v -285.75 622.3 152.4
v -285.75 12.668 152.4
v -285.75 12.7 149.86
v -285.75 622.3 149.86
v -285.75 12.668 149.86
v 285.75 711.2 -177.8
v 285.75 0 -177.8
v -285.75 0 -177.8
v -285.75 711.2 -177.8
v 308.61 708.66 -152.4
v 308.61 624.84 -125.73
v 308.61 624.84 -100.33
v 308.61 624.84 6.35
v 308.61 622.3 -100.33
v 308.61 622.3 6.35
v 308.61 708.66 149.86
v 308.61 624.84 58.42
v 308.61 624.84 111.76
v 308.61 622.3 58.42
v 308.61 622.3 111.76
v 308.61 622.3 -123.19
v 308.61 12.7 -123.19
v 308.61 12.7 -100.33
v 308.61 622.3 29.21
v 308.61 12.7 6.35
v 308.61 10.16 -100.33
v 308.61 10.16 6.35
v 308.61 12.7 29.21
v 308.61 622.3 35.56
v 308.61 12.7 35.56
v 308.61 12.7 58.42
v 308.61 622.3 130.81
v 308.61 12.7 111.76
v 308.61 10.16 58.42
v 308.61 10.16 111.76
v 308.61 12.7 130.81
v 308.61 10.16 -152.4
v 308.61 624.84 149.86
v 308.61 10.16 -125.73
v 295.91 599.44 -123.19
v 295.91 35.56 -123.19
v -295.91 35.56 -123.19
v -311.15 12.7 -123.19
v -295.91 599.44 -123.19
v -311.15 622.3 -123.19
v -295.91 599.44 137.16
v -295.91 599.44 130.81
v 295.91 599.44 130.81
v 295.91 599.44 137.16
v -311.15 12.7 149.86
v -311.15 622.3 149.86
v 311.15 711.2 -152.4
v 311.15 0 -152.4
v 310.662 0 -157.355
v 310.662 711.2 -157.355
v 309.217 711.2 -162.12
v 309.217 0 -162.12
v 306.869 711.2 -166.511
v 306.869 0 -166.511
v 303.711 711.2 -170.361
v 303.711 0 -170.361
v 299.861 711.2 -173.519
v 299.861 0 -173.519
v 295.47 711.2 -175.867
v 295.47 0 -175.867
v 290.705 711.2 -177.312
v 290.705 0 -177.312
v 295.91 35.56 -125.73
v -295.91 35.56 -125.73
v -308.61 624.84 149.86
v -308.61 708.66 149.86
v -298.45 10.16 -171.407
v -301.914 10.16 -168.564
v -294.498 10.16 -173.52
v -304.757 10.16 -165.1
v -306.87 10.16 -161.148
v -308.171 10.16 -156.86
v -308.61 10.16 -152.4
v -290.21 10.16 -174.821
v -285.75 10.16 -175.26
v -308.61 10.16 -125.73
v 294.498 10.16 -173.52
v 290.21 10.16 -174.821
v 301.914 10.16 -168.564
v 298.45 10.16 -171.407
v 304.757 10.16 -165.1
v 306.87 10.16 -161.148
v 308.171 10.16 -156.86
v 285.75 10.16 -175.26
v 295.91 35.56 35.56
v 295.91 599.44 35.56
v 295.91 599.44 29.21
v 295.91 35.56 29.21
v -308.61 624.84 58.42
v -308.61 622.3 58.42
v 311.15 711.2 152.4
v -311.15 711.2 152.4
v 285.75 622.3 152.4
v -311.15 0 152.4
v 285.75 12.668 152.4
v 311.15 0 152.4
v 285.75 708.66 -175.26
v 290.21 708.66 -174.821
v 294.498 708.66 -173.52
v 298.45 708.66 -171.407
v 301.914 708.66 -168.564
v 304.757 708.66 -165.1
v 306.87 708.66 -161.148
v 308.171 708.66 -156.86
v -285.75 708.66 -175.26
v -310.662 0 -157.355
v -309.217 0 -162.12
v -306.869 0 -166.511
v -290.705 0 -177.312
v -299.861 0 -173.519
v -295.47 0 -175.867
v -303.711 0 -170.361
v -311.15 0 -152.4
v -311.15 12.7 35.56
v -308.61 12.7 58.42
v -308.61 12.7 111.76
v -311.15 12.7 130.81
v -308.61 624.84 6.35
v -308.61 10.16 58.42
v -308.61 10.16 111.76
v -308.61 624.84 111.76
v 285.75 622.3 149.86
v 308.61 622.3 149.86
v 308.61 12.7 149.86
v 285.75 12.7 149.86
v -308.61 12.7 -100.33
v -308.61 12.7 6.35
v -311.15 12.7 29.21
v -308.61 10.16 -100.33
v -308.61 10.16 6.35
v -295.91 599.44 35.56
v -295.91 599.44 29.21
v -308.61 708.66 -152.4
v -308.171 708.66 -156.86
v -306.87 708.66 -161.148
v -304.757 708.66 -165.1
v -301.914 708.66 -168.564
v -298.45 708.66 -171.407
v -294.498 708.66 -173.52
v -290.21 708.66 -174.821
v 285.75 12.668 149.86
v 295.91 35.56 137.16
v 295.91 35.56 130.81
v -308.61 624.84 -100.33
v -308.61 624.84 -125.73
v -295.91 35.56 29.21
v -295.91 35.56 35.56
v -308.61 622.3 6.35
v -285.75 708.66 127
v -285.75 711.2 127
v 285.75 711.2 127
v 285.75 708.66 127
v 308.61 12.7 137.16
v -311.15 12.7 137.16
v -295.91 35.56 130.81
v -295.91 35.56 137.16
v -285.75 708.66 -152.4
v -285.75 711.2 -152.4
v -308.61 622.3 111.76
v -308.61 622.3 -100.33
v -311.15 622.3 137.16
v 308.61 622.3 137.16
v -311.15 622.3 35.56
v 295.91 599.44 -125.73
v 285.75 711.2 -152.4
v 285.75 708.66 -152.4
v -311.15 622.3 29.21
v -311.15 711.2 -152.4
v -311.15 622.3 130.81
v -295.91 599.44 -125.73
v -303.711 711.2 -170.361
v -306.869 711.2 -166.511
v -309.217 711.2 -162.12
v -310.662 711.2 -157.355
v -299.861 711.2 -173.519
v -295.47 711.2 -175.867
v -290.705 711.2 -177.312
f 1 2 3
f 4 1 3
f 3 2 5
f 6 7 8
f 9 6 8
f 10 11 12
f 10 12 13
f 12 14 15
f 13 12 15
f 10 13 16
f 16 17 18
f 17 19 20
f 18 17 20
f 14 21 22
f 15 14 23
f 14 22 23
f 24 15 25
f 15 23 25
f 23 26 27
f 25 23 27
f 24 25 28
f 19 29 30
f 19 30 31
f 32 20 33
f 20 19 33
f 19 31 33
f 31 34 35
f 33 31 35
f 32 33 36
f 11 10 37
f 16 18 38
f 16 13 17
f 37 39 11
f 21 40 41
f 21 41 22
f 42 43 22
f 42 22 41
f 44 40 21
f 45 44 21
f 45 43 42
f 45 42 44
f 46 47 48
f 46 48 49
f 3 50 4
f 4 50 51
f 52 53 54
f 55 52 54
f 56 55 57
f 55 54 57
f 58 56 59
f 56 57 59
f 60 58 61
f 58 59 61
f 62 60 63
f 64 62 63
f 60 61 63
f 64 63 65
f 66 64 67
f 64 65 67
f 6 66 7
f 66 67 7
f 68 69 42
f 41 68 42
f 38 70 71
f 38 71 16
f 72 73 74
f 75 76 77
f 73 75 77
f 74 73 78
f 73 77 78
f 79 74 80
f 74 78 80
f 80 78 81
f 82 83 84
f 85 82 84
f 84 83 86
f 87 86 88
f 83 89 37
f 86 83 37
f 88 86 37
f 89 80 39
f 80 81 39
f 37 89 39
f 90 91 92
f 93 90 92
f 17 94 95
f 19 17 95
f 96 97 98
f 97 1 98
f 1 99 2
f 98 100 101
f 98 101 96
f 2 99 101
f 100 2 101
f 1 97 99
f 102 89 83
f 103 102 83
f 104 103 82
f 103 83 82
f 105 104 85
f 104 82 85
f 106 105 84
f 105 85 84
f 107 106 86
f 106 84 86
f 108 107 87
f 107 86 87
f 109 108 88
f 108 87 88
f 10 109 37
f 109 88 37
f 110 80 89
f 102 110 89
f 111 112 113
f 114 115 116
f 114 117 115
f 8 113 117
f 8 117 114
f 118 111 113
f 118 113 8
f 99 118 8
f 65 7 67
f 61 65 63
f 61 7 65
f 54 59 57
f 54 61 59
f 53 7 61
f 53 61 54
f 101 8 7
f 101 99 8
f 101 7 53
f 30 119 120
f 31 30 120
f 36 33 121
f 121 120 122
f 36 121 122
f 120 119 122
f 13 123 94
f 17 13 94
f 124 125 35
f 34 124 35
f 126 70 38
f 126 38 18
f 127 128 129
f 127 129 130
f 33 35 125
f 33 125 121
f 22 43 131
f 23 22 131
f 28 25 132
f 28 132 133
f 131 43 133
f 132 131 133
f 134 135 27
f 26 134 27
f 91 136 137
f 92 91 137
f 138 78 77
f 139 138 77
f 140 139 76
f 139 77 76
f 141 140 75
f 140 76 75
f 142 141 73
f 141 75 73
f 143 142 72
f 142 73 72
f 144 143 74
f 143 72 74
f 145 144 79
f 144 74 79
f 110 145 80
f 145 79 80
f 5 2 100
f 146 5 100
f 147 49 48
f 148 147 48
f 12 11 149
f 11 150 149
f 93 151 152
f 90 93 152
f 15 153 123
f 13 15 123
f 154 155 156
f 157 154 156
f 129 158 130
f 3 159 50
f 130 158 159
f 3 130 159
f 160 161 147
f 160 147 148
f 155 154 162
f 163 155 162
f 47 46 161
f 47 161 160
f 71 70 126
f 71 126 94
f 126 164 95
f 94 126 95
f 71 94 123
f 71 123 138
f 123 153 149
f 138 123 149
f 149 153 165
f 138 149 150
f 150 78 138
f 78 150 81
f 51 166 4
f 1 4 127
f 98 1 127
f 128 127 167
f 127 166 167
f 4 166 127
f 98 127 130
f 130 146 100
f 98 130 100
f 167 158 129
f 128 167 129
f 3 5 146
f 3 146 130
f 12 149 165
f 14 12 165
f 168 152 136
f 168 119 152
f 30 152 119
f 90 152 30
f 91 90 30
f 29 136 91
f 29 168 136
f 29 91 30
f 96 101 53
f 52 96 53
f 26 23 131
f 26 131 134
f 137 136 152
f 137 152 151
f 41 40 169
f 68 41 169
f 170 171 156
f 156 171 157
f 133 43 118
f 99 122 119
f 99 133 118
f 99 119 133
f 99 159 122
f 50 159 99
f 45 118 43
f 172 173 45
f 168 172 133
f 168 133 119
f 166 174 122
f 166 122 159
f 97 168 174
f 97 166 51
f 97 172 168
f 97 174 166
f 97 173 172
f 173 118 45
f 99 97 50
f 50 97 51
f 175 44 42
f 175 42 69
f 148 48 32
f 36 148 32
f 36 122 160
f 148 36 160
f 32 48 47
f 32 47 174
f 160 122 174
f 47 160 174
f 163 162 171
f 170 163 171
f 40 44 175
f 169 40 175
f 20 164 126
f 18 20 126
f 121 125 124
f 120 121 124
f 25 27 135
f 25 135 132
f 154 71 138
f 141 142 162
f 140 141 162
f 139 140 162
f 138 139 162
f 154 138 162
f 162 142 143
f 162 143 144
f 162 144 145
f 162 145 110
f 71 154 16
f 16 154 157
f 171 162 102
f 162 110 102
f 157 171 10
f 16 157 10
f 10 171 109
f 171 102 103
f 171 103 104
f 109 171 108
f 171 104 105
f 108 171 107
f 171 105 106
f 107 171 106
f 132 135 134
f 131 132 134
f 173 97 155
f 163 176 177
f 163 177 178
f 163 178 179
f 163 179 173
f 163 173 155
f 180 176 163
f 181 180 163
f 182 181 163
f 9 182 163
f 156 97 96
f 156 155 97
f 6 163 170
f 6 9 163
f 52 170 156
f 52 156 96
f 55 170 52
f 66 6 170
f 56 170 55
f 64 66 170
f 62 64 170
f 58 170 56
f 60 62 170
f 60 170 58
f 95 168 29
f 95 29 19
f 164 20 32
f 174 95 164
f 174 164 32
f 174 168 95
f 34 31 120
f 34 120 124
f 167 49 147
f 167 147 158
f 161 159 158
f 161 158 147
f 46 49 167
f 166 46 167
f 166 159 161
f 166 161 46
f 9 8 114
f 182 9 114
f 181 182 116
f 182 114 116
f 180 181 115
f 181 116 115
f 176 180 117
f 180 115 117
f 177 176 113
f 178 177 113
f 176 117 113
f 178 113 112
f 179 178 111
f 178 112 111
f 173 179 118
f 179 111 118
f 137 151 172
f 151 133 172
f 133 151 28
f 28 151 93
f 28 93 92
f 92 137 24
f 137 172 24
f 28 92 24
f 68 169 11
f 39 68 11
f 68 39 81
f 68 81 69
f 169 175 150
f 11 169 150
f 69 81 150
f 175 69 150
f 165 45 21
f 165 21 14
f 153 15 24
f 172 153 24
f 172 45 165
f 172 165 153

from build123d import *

# Parameters (mm, degrees)
BOSS_EXTRUDE1_DEPTH = 711.2
BOSS_EXTRUDE2_REACH = 963.601
SKETCH2_W           = 12.7
SKETCH2_H           = 2.54
SKETCH3_W           = 152.4
SKETCH3_H           = 609.6
SKETCH3_W_2         = 95.25
SKETCH3_W_3         = 12.7
CUT_EXTRUDE1_DEPTH  = 2.54
SKETCH4_W           = 12.7
SKETCH4_H           = 6.35
SKETCH4_H_2         = 2.54
BOSS_EXTRUDE3_DEPTH = 589.28
SKETCH5_W           = 571.5
SKETCH5_H           = 12.668198963
BOSS_EXTRUDE4_DEPTH = 2.54
BOSS_EXTRUDE5_START = -2.54
BOSS_EXTRUDE5_DEPTH = 2.54
SKETCH7_W           = 571.5
SKETCH7_H           = 19.05
BOSS_EXTRUDE6_DEPTH = 2.54
SKETCH9_W           = 571.5
SKETCH9_H           = 2.54
BOSS_EXTRUDE7_DEPTH = 69.85
SKETCH10_W          = 571.5
SKETCH10_H          = 22.86
BOSS_EXTRUDE8_DEPTH = 2.54
BOSS_EXTRUDE9_START = 10.16
BOSS_EXTRUDE9_DEPTH = 10.16


with BuildPart() as part:
    # Sketch1 → Boss-Extrude1 (new body)
    with BuildSketch(Plane(origin=(0, 0, 0), x_dir=(1, 0, 0), z_dir=(0, 1, 0))):
        with BuildLine():
            Line((-285.75, 175.26), (285.75, 175.26))
            ThreePointArc((285.75, 175.26), (301.914461018, 168.564461018), (308.61, 152.4))
            Line((308.61, 152.4), (308.61, -149.86))
            Line((308.61, -149.86), (285.75, -149.86))
            Line((285.75, -149.86), (285.75, -152.4))
            Line((285.75, -152.4), (311.15, -152.4))
            Line((311.15, -152.4), (311.15, 152.4))
            ThreePointArc((311.15, 152.4), (303.710512242, 170.360512242), (285.75, 177.8))
            Line((285.75, 177.8), (-285.75, 177.8))
            ThreePointArc((-285.75, 177.8), (-303.710512242, 170.360512242), (-311.15, 152.4))
            Line((-311.15, 152.4), (-311.15, -152.4))
            Line((-311.15, -152.4), (-285.75, -152.4))
            Line((-285.75, -152.4), (-285.75, -149.86))
            Line((-285.75, -149.86), (-308.61, -149.86))
            Line((-308.61, -149.86), (-308.61, 152.4))
            ThreePointArc((-308.61, 152.4), (-301.914461018, 168.564461018), (-285.75, 175.26))
        make_face()
    extrude(amount=BOSS_EXTRUDE1_DEPTH)

    # Boss-Extrude2: up to this face of the body (flat: up to its plane)
    boss_extrude2_end = Plane(part.part.faces().sort_by_distance((308.61, 355.6, -1.27))[0])
    # Sketch2 → Boss-Extrude2 (add, up to the picked face)
    with BuildSketch(Plane.ZY.offset(311.15), mode=Mode.PRIVATE) as boss_extrude2_sk1:
        Polygon((-100.33, 622.3), (-123.19, 622.3), (-123.19, 599.44), (-125.73, 599.44), (-125.73, 624.84), (-100.33, 624.84), align=None)
    boss_extrude2_tool1 = split(extrude(boss_extrude2_sk1.sketch, amount=-BOSS_EXTRUDE2_REACH, mode=Mode.PRIVATE), bisect_by=boss_extrude2_end, keep=Keep.BOTH, mode=Mode.PRIVATE)
    # Sketch2 → Boss-Extrude2 (add, up to the picked face)
    with BuildSketch(Plane.ZY.offset(311.15), mode=Mode.PRIVATE) as boss_extrude2_sk2:
        Polygon((58.42, 622.3), (35.56, 622.3), (35.56, 599.44), (29.21, 599.44), (29.21, 622.3), (6.35, 622.3), (6.35, 624.84), (58.42, 624.84), align=None)
    boss_extrude2_tool2 = split(extrude(boss_extrude2_sk2.sketch, amount=-BOSS_EXTRUDE2_REACH, mode=Mode.PRIVATE), bisect_by=boss_extrude2_end, keep=Keep.BOTH, mode=Mode.PRIVATE)
    # Sketch2 → Boss-Extrude2 (add, up to the picked face)
    with BuildSketch(Plane.ZY.offset(311.15), mode=Mode.PRIVATE) as boss_extrude2_sk3:
        Polygon((134.099064666, 599.44), (130.81, 599.44), (130.81, 622.3), (111.76, 622.3), (111.76, 624.84), (137.16, 624.84), (149.86, 624.84), (149.86, 622.3), (137.16, 622.3), (137.16, 599.44), align=None)
    boss_extrude2_tool3 = split(extrude(boss_extrude2_sk3.sketch, amount=-BOSS_EXTRUDE2_REACH, mode=Mode.PRIVATE), bisect_by=boss_extrude2_end, keep=Keep.BOTH, mode=Mode.PRIVATE)
    # Sketch2 → Boss-Extrude2 (add, up to the picked face)
    with BuildSketch(Plane.ZY.offset(311.15), mode=Mode.PRIVATE) as boss_extrude2_sk4:
        Polygon((-123.19, 35.56), (-123.19, 12.7), (-100.33, 12.7), (-100.33, 10.16), (-125.73, 10.16), (-125.73, 35.56), align=None)
    boss_extrude2_tool4 = split(extrude(boss_extrude2_sk4.sketch, amount=-BOSS_EXTRUDE2_REACH, mode=Mode.PRIVATE), bisect_by=boss_extrude2_end, keep=Keep.BOTH, mode=Mode.PRIVATE)
    # Sketch2 → Boss-Extrude2 (add, up to the picked face)
    with BuildSketch(Plane.ZY.offset(311.15), mode=Mode.PRIVATE) as boss_extrude2_sk5:
        Polygon((58.42, 12.7), (58.42, 10.16), (6.35, 10.16), (6.35, 12.7), (29.21, 12.7), (29.21, 35.56), (35.56, 35.56), (35.56, 12.7), align=None)
    boss_extrude2_tool5 = split(extrude(boss_extrude2_sk5.sketch, amount=-BOSS_EXTRUDE2_REACH, mode=Mode.PRIVATE), bisect_by=boss_extrude2_end, keep=Keep.BOTH, mode=Mode.PRIVATE)
    # Sketch2 → Boss-Extrude2 (add, up to the picked face)
    with BuildSketch(Plane.ZY.offset(311.15), mode=Mode.PRIVATE) as boss_extrude2_sk6:
        Polygon((137.16, 35.56), (137.16, 12.7), (137.16, 10.16), (111.76, 10.16), (111.76, 12.7), (130.81, 12.7), (130.81, 35.56), (134.099064666, 35.56), align=None)
    boss_extrude2_tool6 = split(extrude(boss_extrude2_sk6.sketch, amount=-BOSS_EXTRUDE2_REACH, mode=Mode.PRIVATE), bisect_by=boss_extrude2_end, keep=Keep.BOTH, mode=Mode.PRIVATE)
    # Sketch2 → Boss-Extrude2 (add, up to the picked face)
    with BuildSketch(Plane.ZY.offset(311.15), mode=Mode.PRIVATE) as boss_extrude2_sk7:
        with Locations((143.51, 11.43)):
            Rectangle(SKETCH2_W, SKETCH2_H)
    boss_extrude2_tool7 = split(extrude(boss_extrude2_sk7.sketch, amount=-BOSS_EXTRUDE2_REACH, mode=Mode.PRIVATE), bisect_by=boss_extrude2_end, keep=Keep.BOTH, mode=Mode.PRIVATE)
    add(boss_extrude2_tool1.solids().sort_by(Axis((-311.15, 622.65921, -111.76), (1, 0, 0)))[0])
    add(boss_extrude2_tool2.solids().sort_by(Axis((-311.15, 616.924651, 32.385), (1, 0, 0)))[0])
    add(boss_extrude2_tool3.solids().sort_by(Axis((-311.15, 615.95, 132.715), (1, 0, 0)))[0])
    add(boss_extrude2_tool4.solids().sort_by(Axis((-311.15, 24.13, -123.54921), (1, 0, 0)))[0])
    add(boss_extrude2_tool5.solids().sort_by(Axis((-311.15, 18.075349, 32.385), (1, 0, 0)))[0])
    add(boss_extrude2_tool6.solids().sort_by(Axis((-311.15, 20.222308, 131.054231), (1, 0, 0)))[0])
    add(boss_extrude2_tool7.solids().sort_by(Axis((-311.15, 11.43, 143.51), (1, 0, 0)))[0])

    # Sketch3 → Cut-Extrude1 (cut)
    with BuildSketch(Plane.ZY.offset(311.15)):
        with Locations((-46.99, 317.5)):
            Rectangle(SKETCH3_W, SKETCH3_H)
        with Locations((83.185, 317.5)):
            Rectangle(SKETCH3_W_2, SKETCH3_H)
        with Locations((143.51, 317.5)):
            Rectangle(SKETCH3_W_3, SKETCH3_H)
    extrude(amount=-CUT_EXTRUDE1_DEPTH, mode=Mode.SUBTRACT)

    # Sketch4 → Boss-Extrude3 (add)
    with BuildSketch(Plane(origin=(0, 624.84, 0), x_dir=(1, 0, 0), z_dir=(0, 1, 0))):
        with Locations((-302.26, -32.385)):
            Rectangle(SKETCH4_W, SKETCH4_H)
        with Locations((-302.26, -133.985)):
            Rectangle(SKETCH4_W, SKETCH4_H)
        with Locations((-302.26, 124.46)):
            Rectangle(SKETCH4_W, SKETCH4_H_2)
        with Locations((302.26, -133.985)):
            Rectangle(SKETCH4_W, SKETCH4_H)
        with Locations((302.26, -32.385)):
            Rectangle(SKETCH4_W, SKETCH4_H)
        with Locations((302.26, 124.46)):
            Rectangle(SKETCH4_W, SKETCH4_H_2)
    extrude(amount=-BOSS_EXTRUDE3_DEPTH)

    # Sketch5 → Boss-Extrude4 (add)
    with BuildSketch(Plane.XY.offset(152.4)):
        with Locations((0, 6.334099482)):
            Rectangle(SKETCH5_W, SKETCH5_H)
    extrude(amount=-BOSS_EXTRUDE4_DEPTH)

    # Sketch6 → Boss-Extrude5 (add)
    with BuildSketch(Plane(origin=(0, 711.2, 0), x_dir=(1, 0, 0), z_dir=(0, 1, 0)).offset(BOSS_EXTRUDE5_START)):
        with BuildLine():
            Line((-285.75, -149.86), (-285.75, -124.46))
            Line((-285.75, -124.46), (-285.75, 152.4))
            Line((-285.75, 152.4), (285.75, 152.4))
            Line((285.75, 152.4), (285.75, -127))
            Line((285.75, -127), (285.75, -149.86))
            Line((285.75, -149.86), (308.61, -149.86))
            Line((308.61, -149.86), (308.61, 152.4))
            ThreePointArc((308.61, 152.4), (301.914461018, 168.564461018), (285.75, 175.26))
            Line((285.75, 175.26), (-285.75, 175.26))
            ThreePointArc((-285.75, 175.26), (-301.914461018, 168.564461018), (-308.61, 152.4))
            Line((-308.61, 152.4), (-308.61, -149.86))
            Line((-308.61, -149.86), (-285.75, -149.86))
        make_face()
    extrude(amount=BOSS_EXTRUDE5_DEPTH)

    # Sketch7 → Boss-Extrude6 (add)
    with BuildSketch(Plane.XY.offset(149.86)):
        with Locations((0, 631.825)):
            Rectangle(SKETCH7_W, SKETCH7_H)
    extrude(amount=BOSS_EXTRUDE6_DEPTH)

    # Sketch9 → Boss-Extrude7 (add)
    with BuildSketch(Plane(origin=(0, 641.35, 0), x_dir=(1, 0, 0), z_dir=(0, 1, 0))):
        with Locations((0, -151.13)):
            Rectangle(SKETCH9_W, SKETCH9_H)
    extrude(amount=BOSS_EXTRUDE7_DEPTH)

    # Sketch10 → Boss-Extrude8 (add)
    with BuildSketch(Plane(origin=(0, 711.2, 0), x_dir=(1, 0, 0), z_dir=(0, 1, 0))):
        with Locations((0, -138.43)):
            Rectangle(SKETCH10_W, SKETCH10_H)
    extrude(amount=-BOSS_EXTRUDE8_DEPTH)

    # Sketch11 → Boss-Extrude9 (add)
    with BuildSketch(Plane.XZ.offset(-10.16).offset(BOSS_EXTRUDE9_START)):
        with BuildLine():
            Line((-308.61, 149.86), (-308.61, -152.4))
            ThreePointArc((-308.61, -152.4), (-301.914461018, -168.564461018), (-285.75, -175.26))
            Line((-285.75, -175.26), (285.75, -175.26))
            ThreePointArc((285.75, -175.26), (301.914461018, -168.564461018), (308.61, -152.4))
            Line((308.61, -152.4), (308.61, 149.86))
            Line((308.61, 149.86), (-308.61, 149.86))
        make_face()
    extrude(amount=-BOSS_EXTRUDE9_DEPTH)


solid = part.part
